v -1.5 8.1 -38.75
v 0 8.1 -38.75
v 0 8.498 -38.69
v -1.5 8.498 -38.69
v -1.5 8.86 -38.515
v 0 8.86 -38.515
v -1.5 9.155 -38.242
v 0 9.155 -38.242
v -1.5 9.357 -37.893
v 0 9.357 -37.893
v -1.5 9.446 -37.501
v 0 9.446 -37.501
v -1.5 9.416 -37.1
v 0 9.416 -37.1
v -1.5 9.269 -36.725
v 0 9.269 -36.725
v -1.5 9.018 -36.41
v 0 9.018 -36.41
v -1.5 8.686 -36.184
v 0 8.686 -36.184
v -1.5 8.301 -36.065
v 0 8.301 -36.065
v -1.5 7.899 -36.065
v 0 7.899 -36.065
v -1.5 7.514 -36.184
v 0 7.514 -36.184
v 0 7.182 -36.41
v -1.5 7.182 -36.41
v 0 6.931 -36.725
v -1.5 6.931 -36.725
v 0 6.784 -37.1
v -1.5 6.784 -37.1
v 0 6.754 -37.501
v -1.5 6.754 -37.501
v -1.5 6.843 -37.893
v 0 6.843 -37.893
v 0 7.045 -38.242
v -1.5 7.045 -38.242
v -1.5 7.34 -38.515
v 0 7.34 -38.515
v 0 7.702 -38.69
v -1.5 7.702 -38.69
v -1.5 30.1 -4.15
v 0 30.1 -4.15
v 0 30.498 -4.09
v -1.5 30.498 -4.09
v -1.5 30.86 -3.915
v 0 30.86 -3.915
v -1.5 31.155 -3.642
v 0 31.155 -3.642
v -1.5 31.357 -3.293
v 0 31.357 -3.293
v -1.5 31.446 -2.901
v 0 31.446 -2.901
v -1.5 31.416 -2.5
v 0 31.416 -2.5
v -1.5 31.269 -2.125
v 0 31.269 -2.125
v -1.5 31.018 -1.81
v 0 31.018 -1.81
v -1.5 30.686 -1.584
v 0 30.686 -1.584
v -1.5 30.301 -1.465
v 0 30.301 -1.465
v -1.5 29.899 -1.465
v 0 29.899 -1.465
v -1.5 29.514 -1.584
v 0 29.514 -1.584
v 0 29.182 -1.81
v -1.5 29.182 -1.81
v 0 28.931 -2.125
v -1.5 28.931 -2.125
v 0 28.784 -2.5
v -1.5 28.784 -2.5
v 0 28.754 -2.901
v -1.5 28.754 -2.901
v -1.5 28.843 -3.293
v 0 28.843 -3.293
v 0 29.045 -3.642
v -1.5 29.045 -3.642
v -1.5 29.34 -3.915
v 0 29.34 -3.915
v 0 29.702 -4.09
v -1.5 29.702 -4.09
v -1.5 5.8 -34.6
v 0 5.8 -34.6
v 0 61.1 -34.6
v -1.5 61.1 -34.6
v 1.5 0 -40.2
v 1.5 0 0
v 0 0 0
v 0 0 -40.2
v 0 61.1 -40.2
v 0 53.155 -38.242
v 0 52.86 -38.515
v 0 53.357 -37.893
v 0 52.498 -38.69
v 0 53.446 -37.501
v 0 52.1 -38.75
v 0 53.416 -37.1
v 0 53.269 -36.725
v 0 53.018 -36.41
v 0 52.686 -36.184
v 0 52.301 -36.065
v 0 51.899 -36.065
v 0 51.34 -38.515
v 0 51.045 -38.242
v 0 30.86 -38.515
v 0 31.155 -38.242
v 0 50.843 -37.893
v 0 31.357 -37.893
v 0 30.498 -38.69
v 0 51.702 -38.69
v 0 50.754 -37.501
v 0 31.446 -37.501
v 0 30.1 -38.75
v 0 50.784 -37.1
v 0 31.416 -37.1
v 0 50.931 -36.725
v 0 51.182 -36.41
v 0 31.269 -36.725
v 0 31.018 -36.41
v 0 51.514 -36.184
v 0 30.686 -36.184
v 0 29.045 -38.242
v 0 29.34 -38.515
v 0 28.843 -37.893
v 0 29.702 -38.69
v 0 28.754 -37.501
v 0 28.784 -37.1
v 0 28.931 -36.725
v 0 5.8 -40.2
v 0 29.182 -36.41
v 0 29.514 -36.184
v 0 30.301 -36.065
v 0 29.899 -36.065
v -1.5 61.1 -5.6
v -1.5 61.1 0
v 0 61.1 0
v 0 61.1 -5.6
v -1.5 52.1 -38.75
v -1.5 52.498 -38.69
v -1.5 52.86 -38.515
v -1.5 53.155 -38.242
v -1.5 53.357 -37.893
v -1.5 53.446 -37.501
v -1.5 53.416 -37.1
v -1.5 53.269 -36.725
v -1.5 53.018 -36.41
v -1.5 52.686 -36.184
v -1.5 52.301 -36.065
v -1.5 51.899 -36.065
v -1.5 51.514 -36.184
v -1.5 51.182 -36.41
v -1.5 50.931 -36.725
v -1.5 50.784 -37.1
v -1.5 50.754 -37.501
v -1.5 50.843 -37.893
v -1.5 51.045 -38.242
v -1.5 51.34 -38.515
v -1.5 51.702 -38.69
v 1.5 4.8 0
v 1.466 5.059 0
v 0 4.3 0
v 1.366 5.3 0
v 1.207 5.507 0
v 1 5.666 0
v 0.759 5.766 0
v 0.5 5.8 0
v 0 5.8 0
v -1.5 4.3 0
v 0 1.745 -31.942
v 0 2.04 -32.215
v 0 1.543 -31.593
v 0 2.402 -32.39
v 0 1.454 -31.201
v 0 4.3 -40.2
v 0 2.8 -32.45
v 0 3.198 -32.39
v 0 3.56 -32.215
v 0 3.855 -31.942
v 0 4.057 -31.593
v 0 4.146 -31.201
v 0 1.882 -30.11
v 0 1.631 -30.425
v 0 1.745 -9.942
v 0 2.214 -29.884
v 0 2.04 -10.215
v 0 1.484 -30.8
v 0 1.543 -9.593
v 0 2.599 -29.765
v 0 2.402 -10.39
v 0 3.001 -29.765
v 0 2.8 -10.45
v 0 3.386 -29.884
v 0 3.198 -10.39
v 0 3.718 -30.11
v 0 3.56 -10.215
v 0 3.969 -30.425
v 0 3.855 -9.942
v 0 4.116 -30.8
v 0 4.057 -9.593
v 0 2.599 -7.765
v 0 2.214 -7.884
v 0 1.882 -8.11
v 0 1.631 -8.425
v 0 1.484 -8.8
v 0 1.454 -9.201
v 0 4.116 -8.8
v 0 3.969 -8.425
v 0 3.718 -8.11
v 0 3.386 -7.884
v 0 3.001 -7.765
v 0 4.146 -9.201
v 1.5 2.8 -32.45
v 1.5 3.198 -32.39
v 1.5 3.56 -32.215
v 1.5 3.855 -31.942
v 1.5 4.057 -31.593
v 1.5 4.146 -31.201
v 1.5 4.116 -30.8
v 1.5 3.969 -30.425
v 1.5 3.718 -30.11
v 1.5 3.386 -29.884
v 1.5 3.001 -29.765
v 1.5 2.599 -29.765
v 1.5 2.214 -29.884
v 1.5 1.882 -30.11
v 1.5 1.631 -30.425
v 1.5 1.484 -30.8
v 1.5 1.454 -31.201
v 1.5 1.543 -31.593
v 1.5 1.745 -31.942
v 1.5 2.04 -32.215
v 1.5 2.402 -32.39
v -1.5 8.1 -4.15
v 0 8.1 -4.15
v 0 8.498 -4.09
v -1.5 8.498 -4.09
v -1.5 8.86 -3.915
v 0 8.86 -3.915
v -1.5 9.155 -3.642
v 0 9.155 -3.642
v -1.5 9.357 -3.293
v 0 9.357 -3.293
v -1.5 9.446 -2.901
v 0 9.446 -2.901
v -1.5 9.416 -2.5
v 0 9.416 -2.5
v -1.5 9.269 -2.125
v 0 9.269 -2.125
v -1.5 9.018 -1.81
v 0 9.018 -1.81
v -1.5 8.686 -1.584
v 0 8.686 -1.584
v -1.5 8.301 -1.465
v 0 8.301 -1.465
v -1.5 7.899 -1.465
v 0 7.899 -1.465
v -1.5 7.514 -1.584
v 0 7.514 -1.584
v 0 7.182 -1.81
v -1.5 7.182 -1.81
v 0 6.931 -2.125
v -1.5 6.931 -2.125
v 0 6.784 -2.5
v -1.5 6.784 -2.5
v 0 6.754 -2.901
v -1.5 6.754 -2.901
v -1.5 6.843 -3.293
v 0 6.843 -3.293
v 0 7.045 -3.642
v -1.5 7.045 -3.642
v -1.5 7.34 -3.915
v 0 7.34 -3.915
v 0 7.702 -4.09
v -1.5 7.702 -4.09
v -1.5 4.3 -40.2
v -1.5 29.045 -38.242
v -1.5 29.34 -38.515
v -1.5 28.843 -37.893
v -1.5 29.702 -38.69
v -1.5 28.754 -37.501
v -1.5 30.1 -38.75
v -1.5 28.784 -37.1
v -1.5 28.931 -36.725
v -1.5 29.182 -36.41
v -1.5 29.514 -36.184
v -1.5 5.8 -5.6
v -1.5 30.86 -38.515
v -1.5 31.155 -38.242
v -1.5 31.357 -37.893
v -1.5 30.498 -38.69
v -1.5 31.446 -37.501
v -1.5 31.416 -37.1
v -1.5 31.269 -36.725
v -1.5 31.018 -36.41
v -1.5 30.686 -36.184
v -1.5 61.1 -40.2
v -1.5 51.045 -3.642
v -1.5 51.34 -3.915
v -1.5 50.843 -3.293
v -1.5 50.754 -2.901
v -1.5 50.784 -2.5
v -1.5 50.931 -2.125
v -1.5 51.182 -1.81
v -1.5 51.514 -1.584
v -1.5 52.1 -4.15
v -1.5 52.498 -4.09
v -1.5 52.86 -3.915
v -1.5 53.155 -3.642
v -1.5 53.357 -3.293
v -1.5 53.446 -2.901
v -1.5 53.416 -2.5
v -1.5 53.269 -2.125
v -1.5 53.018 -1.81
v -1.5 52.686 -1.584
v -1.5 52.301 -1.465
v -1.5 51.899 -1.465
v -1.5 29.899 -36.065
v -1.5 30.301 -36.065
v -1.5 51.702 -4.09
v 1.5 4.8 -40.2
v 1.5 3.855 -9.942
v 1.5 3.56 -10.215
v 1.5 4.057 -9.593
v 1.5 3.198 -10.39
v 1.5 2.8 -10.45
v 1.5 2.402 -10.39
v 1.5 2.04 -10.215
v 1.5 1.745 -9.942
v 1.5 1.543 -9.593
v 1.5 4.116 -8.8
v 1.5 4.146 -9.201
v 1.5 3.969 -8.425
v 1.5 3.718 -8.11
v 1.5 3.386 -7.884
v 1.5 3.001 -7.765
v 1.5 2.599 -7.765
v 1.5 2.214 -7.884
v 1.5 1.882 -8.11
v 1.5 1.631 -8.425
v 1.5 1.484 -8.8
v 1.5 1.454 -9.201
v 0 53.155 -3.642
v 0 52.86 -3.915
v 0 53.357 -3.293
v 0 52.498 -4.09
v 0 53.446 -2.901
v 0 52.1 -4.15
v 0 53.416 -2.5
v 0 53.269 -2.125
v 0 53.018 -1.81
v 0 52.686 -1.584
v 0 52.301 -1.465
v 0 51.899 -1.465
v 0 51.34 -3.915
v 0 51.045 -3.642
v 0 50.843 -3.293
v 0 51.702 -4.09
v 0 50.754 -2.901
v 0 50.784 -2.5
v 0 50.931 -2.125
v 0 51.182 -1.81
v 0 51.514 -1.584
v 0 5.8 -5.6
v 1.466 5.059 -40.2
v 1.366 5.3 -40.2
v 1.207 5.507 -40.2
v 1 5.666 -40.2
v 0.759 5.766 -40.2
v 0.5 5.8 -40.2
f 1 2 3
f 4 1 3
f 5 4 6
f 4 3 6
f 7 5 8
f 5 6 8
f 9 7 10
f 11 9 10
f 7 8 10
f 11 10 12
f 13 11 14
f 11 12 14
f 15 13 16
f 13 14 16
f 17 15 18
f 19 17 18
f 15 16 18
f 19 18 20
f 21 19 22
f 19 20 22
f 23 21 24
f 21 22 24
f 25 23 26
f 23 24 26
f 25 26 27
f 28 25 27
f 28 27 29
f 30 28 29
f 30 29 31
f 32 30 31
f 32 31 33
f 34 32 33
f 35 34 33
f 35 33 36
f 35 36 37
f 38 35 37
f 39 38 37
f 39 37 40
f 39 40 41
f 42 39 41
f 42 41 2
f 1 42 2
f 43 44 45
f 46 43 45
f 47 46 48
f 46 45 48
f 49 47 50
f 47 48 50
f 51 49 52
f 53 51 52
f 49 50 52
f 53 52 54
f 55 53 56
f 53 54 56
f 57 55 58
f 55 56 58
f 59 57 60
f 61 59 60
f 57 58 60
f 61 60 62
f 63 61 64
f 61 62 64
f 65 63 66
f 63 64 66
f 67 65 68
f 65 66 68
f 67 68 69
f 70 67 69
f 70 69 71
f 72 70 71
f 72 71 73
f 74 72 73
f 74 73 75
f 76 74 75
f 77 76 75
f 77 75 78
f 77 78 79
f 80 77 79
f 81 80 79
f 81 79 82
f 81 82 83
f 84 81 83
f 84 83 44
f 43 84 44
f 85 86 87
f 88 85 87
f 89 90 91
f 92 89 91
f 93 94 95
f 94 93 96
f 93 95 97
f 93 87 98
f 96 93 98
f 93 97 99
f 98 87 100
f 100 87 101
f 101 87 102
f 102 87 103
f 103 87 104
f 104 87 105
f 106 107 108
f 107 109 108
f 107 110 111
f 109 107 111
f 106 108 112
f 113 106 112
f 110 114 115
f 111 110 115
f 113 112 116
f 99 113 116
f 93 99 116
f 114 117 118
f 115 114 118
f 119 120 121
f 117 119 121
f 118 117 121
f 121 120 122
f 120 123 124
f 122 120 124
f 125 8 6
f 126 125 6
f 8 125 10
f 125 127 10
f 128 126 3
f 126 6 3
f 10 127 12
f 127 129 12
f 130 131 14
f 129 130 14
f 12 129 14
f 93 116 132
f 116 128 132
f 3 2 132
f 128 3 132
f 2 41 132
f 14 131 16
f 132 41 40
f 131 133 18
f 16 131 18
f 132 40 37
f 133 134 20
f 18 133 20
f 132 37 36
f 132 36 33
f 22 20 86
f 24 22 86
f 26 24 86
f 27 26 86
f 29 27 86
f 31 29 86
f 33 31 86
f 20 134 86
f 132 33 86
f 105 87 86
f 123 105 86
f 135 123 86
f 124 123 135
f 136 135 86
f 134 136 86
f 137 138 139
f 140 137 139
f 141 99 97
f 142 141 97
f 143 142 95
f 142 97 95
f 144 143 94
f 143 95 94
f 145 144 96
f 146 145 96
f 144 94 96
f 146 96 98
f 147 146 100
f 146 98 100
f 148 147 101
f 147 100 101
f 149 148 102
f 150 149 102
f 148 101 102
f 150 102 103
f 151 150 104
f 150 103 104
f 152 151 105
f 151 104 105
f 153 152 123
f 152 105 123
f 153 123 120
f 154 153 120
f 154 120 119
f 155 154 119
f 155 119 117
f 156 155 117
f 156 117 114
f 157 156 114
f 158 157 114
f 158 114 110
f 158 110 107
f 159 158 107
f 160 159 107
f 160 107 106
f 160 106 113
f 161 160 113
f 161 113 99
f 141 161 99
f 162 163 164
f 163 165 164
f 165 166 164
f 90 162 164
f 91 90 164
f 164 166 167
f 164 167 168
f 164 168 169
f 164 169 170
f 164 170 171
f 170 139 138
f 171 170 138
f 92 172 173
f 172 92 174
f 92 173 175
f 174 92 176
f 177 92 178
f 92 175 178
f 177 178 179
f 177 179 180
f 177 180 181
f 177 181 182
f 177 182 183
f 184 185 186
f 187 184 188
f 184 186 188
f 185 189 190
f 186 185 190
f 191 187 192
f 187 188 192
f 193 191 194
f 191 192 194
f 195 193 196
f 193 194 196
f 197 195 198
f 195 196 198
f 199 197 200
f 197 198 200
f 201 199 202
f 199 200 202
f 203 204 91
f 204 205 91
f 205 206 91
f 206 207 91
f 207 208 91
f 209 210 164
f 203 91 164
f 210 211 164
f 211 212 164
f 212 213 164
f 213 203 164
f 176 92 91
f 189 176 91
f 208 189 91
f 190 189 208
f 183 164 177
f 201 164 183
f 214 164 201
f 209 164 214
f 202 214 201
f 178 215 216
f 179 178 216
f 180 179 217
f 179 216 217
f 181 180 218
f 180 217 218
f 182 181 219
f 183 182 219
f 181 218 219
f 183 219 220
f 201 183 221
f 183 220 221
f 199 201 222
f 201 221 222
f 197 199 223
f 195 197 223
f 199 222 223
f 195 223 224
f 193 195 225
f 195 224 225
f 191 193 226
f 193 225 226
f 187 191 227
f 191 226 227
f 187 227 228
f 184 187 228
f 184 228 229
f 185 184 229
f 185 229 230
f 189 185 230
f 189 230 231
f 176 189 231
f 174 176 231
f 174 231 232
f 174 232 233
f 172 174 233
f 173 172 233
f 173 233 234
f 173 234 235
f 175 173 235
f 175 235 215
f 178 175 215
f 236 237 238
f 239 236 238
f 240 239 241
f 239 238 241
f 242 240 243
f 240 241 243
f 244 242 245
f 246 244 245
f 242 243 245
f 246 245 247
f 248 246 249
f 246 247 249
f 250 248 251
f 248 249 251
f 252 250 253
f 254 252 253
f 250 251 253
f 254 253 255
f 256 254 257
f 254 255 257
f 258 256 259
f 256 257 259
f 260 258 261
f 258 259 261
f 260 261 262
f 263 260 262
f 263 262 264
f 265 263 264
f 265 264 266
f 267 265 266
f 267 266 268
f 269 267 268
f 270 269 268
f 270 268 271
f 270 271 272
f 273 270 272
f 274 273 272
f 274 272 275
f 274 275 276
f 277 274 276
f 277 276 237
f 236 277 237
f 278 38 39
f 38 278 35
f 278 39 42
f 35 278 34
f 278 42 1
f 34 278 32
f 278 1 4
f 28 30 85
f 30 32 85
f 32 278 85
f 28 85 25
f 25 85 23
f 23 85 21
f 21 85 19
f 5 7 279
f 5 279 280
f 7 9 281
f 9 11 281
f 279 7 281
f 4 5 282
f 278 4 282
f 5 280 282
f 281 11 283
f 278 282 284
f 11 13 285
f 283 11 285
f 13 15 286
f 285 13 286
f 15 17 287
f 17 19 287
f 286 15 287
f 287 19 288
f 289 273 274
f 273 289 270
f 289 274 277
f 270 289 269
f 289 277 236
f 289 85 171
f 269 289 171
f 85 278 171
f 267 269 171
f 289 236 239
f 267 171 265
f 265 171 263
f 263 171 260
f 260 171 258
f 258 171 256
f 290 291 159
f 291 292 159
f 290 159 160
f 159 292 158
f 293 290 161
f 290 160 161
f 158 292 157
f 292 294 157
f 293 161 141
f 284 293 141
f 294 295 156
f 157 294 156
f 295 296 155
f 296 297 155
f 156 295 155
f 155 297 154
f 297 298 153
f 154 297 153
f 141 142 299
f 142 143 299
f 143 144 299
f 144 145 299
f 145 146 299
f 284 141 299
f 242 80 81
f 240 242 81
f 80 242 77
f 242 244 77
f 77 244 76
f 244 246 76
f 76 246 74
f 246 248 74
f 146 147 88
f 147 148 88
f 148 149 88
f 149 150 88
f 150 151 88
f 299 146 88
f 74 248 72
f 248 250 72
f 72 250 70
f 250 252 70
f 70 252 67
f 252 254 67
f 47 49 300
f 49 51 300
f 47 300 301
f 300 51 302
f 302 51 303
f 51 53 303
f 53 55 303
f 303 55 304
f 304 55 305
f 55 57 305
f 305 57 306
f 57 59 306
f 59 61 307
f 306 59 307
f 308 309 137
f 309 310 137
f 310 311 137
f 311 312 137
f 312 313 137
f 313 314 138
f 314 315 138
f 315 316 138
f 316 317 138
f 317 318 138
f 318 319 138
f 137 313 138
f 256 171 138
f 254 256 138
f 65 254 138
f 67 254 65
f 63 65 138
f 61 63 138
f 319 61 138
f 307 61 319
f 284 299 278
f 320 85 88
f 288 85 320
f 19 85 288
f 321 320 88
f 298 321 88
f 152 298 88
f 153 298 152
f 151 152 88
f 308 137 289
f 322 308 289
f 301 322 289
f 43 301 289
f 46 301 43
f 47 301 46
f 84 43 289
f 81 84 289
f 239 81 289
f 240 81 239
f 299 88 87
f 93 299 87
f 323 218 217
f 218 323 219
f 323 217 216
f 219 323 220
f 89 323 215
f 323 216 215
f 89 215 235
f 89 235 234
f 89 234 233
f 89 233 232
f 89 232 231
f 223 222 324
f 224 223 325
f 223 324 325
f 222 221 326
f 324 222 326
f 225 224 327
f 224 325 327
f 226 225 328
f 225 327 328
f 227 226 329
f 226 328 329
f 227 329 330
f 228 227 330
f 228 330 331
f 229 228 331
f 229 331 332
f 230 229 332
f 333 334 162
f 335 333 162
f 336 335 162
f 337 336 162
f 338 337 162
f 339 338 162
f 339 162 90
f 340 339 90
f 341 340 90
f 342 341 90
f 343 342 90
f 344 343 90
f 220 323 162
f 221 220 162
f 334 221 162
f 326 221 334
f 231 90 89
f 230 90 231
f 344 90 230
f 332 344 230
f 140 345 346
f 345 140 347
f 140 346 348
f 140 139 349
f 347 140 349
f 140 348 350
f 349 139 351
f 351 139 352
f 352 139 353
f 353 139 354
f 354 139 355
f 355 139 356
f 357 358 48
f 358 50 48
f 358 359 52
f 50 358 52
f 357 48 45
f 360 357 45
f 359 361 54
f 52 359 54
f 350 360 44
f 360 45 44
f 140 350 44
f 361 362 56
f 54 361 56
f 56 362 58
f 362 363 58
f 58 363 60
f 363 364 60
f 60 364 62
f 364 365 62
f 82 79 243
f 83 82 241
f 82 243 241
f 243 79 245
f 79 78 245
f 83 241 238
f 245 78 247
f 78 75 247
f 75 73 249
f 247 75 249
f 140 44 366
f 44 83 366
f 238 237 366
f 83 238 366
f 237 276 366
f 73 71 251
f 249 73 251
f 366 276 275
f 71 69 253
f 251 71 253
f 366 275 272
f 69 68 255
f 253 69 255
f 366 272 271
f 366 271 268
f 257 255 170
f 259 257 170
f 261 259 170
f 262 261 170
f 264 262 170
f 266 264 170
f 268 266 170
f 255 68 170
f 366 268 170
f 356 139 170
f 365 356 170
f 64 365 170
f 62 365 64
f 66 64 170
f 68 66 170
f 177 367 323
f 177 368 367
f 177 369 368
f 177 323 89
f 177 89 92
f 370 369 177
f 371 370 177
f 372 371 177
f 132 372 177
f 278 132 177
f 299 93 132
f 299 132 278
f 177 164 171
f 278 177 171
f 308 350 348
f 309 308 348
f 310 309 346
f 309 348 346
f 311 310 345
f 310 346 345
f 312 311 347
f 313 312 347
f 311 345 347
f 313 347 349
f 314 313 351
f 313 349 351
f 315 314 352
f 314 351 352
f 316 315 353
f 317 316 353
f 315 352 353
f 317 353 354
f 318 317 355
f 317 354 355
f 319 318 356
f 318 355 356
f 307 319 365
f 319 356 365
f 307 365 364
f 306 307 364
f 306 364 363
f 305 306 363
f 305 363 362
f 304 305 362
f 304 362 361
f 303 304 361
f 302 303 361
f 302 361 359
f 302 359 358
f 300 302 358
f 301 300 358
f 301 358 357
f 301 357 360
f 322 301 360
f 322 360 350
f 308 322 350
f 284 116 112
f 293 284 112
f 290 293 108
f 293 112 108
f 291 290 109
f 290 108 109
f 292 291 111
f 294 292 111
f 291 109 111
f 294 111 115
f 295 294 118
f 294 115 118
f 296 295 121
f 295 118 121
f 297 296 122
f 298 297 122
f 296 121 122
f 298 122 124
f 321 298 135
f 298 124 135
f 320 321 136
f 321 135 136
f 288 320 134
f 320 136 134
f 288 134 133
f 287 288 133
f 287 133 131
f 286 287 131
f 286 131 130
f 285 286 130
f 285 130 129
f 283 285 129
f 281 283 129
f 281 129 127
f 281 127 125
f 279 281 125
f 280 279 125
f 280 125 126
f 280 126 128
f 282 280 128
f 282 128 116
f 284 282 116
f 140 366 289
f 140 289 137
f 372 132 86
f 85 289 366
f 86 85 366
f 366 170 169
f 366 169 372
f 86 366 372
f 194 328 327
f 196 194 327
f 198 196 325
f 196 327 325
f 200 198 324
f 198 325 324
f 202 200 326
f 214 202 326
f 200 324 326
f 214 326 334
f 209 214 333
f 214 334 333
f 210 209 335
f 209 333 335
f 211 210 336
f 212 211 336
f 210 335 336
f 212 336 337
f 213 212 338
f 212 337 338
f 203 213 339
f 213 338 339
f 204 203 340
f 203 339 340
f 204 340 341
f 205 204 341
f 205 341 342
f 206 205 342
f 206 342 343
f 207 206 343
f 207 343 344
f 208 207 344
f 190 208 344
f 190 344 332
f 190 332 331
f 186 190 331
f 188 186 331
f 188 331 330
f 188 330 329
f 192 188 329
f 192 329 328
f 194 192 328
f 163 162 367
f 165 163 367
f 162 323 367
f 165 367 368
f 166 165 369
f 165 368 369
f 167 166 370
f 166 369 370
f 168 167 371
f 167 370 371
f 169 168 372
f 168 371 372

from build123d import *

# Parameters (mm, degrees)
BOSS_EXTRUDE1_DEPTH = 40.2
CUT_EXTRUDE2_REACH  = 3.5
SKETCH3_R           = 1.35
SKETCH3_W           = 29
SKETCH3_H           = 55.3
FILLET1_R           = 1
CUT_EXTRUDE3_REACH  = 5
SKETCH4_R           = 1.35


with BuildPart() as part:
    # Sketch1 → Boss-Extrude1 (new body)
    with BuildSketch(Plane.XY):
        Polygon((0, 0), (0, 4.3), (-1.5, 4.3), (-1.5, 61.1), (0, 61.1), (0, 5.8), (1.5, 5.8), (1.5, 0), align=None)
    extrude(amount=-BOSS_EXTRUDE1_DEPTH)

    # Sketch3 → Cut-Extrude2 (cut, up to next)
    with BuildSketch(Plane(origin=(0, 0, 0), x_dir=(0, 0, -1), z_dir=(1, 0, 0)), mode=Mode.PRIVATE) as cut_extrude2_sk1:
        with Locations((2.8, 8.1)):
            Circle(SKETCH3_R)
    cut_extrude2_tool1 = extrude(cut_extrude2_sk1.sketch, amount=-CUT_EXTRUDE2_REACH, mode=Mode.PRIVATE) & part.part
    add(cut_extrude2_tool1.solids().sort_by_distance((0, 8.1, -2.8))[0], mode=Mode.SUBTRACT)
    # Sketch3 → Cut-Extrude2 (cut, up to next)
    with BuildSketch(Plane(origin=(0, 0, 0), x_dir=(0, 0, -1), z_dir=(1, 0, 0)), mode=Mode.PRIVATE) as cut_extrude2_sk2:
        with Locations((37.4, 8.1)):
            Circle(SKETCH3_R)
    cut_extrude2_tool2 = extrude(cut_extrude2_sk2.sketch, amount=-CUT_EXTRUDE2_REACH, mode=Mode.PRIVATE) & part.part
    add(cut_extrude2_tool2.solids().sort_by_distance((0, 8.1, -37.4))[0], mode=Mode.SUBTRACT)
    # Sketch3 → Cut-Extrude2 (cut, up to next)
    with BuildSketch(Plane(origin=(0, 0, 0), x_dir=(0, 0, -1), z_dir=(1, 0, 0)), mode=Mode.PRIVATE) as cut_extrude2_sk3:
        with Locations((2.8, 30.1)):
            Circle(SKETCH3_R)
    cut_extrude2_tool3 = extrude(cut_extrude2_sk3.sketch, amount=-CUT_EXTRUDE2_REACH, mode=Mode.PRIVATE) & part.part
    add(cut_extrude2_tool3.solids().sort_by_distance((0, 30.1, -2.8))[0], mode=Mode.SUBTRACT)
    # Sketch3 → Cut-Extrude2 (cut, up to next)
    with BuildSketch(Plane(origin=(0, 0, 0), x_dir=(0, 0, -1), z_dir=(1, 0, 0)), mode=Mode.PRIVATE) as cut_extrude2_sk4:
        with Locations((37.4, 30.1)):
            Circle(SKETCH3_R)
    cut_extrude2_tool4 = extrude(cut_extrude2_sk4.sketch, amount=-CUT_EXTRUDE2_REACH, mode=Mode.PRIVATE) & part.part
    add(cut_extrude2_tool4.solids().sort_by_distance((0, 30.1, -37.4))[0], mode=Mode.SUBTRACT)
    # Sketch3 → Cut-Extrude2 (cut, up to next)
    with BuildSketch(Plane(origin=(0, 0, 0), x_dir=(0, 0, -1), z_dir=(1, 0, 0)), mode=Mode.PRIVATE) as cut_extrude2_sk5:
        with Locations((2.8, 52.1)):
            Circle(SKETCH3_R)
    cut_extrude2_tool5 = extrude(cut_extrude2_sk5.sketch, amount=-CUT_EXTRUDE2_REACH, mode=Mode.PRIVATE) & part.part
    add(cut_extrude2_tool5.solids().sort_by_distance((0, 52.1, -2.8))[0], mode=Mode.SUBTRACT)
    # Sketch3 → Cut-Extrude2 (cut, up to next)
    with BuildSketch(Plane(origin=(0, 0, 0), x_dir=(0, 0, -1), z_dir=(1, 0, 0)), mode=Mode.PRIVATE) as cut_extrude2_sk6:
        with Locations((37.4, 52.1)):
            Circle(SKETCH3_R)
    cut_extrude2_tool6 = extrude(cut_extrude2_sk6.sketch, amount=-CUT_EXTRUDE2_REACH, mode=Mode.PRIVATE) & part.part
    add(cut_extrude2_tool6.solids().sort_by_distance((0, 52.1, -37.4))[0], mode=Mode.SUBTRACT)
    # Sketch3 → Cut-Extrude2 (cut, up to next)
    with BuildSketch(Plane(origin=(0, 0, 0), x_dir=(0, 0, -1), z_dir=(1, 0, 0)), mode=Mode.PRIVATE) as cut_extrude2_sk7:
        with Locations((20.1, 33.45)):
            Rectangle(SKETCH3_W, SKETCH3_H)
    cut_extrude2_tool7 = extrude(cut_extrude2_sk7.sketch, amount=-CUT_EXTRUDE2_REACH, mode=Mode.PRIVATE) & part.part
    add(cut_extrude2_tool7.solids().sort_by_distance((0, 33.45, -20.1))[0], mode=Mode.SUBTRACT)

    # Fillet1
    fillet1_edges = [part.edges().sort_by_distance(p)[0] for p in [
        (1.5, 5.8, -20.1),
    ]]
    fillet(fillet1_edges, radius=FILLET1_R)

    # Sketch4 → Cut-Extrude3 (cut, up to next)
    with BuildSketch(Plane(origin=(1.5, 0, 0), x_dir=(0, 0, -1), z_dir=(1, 0, 0)), mode=Mode.PRIVATE) as cut_extrude3_sk1:
        with Locations((9.1, 2.8)):
            Circle(SKETCH4_R)
    cut_extrude3_tool1 = extrude(cut_extrude3_sk1.sketch, amount=-CUT_EXTRUDE3_REACH, mode=Mode.PRIVATE) & part.part
    add(cut_extrude3_tool1.solids().sort_by_distance((1.5, 2.8, -9.1))[0], mode=Mode.SUBTRACT)
    # Sketch4 → Cut-Extrude3 (cut, up to next)
    with BuildSketch(Plane(origin=(1.5, 0, 0), x_dir=(0, 0, -1), z_dir=(1, 0, 0)), mode=Mode.PRIVATE) as cut_extrude3_sk2:
        with Locations((31.1, 2.8)):
            Circle(SKETCH4_R)
    cut_extrude3_tool2 = extrude(cut_extrude3_sk2.sketch, amount=-CUT_EXTRUDE3_REACH, mode=Mode.PRIVATE) & part.part
    add(cut_extrude3_tool2.solids().sort_by_distance((1.5, 2.8, -31.1))[0], mode=Mode.SUBTRACT)


solid = part.part
